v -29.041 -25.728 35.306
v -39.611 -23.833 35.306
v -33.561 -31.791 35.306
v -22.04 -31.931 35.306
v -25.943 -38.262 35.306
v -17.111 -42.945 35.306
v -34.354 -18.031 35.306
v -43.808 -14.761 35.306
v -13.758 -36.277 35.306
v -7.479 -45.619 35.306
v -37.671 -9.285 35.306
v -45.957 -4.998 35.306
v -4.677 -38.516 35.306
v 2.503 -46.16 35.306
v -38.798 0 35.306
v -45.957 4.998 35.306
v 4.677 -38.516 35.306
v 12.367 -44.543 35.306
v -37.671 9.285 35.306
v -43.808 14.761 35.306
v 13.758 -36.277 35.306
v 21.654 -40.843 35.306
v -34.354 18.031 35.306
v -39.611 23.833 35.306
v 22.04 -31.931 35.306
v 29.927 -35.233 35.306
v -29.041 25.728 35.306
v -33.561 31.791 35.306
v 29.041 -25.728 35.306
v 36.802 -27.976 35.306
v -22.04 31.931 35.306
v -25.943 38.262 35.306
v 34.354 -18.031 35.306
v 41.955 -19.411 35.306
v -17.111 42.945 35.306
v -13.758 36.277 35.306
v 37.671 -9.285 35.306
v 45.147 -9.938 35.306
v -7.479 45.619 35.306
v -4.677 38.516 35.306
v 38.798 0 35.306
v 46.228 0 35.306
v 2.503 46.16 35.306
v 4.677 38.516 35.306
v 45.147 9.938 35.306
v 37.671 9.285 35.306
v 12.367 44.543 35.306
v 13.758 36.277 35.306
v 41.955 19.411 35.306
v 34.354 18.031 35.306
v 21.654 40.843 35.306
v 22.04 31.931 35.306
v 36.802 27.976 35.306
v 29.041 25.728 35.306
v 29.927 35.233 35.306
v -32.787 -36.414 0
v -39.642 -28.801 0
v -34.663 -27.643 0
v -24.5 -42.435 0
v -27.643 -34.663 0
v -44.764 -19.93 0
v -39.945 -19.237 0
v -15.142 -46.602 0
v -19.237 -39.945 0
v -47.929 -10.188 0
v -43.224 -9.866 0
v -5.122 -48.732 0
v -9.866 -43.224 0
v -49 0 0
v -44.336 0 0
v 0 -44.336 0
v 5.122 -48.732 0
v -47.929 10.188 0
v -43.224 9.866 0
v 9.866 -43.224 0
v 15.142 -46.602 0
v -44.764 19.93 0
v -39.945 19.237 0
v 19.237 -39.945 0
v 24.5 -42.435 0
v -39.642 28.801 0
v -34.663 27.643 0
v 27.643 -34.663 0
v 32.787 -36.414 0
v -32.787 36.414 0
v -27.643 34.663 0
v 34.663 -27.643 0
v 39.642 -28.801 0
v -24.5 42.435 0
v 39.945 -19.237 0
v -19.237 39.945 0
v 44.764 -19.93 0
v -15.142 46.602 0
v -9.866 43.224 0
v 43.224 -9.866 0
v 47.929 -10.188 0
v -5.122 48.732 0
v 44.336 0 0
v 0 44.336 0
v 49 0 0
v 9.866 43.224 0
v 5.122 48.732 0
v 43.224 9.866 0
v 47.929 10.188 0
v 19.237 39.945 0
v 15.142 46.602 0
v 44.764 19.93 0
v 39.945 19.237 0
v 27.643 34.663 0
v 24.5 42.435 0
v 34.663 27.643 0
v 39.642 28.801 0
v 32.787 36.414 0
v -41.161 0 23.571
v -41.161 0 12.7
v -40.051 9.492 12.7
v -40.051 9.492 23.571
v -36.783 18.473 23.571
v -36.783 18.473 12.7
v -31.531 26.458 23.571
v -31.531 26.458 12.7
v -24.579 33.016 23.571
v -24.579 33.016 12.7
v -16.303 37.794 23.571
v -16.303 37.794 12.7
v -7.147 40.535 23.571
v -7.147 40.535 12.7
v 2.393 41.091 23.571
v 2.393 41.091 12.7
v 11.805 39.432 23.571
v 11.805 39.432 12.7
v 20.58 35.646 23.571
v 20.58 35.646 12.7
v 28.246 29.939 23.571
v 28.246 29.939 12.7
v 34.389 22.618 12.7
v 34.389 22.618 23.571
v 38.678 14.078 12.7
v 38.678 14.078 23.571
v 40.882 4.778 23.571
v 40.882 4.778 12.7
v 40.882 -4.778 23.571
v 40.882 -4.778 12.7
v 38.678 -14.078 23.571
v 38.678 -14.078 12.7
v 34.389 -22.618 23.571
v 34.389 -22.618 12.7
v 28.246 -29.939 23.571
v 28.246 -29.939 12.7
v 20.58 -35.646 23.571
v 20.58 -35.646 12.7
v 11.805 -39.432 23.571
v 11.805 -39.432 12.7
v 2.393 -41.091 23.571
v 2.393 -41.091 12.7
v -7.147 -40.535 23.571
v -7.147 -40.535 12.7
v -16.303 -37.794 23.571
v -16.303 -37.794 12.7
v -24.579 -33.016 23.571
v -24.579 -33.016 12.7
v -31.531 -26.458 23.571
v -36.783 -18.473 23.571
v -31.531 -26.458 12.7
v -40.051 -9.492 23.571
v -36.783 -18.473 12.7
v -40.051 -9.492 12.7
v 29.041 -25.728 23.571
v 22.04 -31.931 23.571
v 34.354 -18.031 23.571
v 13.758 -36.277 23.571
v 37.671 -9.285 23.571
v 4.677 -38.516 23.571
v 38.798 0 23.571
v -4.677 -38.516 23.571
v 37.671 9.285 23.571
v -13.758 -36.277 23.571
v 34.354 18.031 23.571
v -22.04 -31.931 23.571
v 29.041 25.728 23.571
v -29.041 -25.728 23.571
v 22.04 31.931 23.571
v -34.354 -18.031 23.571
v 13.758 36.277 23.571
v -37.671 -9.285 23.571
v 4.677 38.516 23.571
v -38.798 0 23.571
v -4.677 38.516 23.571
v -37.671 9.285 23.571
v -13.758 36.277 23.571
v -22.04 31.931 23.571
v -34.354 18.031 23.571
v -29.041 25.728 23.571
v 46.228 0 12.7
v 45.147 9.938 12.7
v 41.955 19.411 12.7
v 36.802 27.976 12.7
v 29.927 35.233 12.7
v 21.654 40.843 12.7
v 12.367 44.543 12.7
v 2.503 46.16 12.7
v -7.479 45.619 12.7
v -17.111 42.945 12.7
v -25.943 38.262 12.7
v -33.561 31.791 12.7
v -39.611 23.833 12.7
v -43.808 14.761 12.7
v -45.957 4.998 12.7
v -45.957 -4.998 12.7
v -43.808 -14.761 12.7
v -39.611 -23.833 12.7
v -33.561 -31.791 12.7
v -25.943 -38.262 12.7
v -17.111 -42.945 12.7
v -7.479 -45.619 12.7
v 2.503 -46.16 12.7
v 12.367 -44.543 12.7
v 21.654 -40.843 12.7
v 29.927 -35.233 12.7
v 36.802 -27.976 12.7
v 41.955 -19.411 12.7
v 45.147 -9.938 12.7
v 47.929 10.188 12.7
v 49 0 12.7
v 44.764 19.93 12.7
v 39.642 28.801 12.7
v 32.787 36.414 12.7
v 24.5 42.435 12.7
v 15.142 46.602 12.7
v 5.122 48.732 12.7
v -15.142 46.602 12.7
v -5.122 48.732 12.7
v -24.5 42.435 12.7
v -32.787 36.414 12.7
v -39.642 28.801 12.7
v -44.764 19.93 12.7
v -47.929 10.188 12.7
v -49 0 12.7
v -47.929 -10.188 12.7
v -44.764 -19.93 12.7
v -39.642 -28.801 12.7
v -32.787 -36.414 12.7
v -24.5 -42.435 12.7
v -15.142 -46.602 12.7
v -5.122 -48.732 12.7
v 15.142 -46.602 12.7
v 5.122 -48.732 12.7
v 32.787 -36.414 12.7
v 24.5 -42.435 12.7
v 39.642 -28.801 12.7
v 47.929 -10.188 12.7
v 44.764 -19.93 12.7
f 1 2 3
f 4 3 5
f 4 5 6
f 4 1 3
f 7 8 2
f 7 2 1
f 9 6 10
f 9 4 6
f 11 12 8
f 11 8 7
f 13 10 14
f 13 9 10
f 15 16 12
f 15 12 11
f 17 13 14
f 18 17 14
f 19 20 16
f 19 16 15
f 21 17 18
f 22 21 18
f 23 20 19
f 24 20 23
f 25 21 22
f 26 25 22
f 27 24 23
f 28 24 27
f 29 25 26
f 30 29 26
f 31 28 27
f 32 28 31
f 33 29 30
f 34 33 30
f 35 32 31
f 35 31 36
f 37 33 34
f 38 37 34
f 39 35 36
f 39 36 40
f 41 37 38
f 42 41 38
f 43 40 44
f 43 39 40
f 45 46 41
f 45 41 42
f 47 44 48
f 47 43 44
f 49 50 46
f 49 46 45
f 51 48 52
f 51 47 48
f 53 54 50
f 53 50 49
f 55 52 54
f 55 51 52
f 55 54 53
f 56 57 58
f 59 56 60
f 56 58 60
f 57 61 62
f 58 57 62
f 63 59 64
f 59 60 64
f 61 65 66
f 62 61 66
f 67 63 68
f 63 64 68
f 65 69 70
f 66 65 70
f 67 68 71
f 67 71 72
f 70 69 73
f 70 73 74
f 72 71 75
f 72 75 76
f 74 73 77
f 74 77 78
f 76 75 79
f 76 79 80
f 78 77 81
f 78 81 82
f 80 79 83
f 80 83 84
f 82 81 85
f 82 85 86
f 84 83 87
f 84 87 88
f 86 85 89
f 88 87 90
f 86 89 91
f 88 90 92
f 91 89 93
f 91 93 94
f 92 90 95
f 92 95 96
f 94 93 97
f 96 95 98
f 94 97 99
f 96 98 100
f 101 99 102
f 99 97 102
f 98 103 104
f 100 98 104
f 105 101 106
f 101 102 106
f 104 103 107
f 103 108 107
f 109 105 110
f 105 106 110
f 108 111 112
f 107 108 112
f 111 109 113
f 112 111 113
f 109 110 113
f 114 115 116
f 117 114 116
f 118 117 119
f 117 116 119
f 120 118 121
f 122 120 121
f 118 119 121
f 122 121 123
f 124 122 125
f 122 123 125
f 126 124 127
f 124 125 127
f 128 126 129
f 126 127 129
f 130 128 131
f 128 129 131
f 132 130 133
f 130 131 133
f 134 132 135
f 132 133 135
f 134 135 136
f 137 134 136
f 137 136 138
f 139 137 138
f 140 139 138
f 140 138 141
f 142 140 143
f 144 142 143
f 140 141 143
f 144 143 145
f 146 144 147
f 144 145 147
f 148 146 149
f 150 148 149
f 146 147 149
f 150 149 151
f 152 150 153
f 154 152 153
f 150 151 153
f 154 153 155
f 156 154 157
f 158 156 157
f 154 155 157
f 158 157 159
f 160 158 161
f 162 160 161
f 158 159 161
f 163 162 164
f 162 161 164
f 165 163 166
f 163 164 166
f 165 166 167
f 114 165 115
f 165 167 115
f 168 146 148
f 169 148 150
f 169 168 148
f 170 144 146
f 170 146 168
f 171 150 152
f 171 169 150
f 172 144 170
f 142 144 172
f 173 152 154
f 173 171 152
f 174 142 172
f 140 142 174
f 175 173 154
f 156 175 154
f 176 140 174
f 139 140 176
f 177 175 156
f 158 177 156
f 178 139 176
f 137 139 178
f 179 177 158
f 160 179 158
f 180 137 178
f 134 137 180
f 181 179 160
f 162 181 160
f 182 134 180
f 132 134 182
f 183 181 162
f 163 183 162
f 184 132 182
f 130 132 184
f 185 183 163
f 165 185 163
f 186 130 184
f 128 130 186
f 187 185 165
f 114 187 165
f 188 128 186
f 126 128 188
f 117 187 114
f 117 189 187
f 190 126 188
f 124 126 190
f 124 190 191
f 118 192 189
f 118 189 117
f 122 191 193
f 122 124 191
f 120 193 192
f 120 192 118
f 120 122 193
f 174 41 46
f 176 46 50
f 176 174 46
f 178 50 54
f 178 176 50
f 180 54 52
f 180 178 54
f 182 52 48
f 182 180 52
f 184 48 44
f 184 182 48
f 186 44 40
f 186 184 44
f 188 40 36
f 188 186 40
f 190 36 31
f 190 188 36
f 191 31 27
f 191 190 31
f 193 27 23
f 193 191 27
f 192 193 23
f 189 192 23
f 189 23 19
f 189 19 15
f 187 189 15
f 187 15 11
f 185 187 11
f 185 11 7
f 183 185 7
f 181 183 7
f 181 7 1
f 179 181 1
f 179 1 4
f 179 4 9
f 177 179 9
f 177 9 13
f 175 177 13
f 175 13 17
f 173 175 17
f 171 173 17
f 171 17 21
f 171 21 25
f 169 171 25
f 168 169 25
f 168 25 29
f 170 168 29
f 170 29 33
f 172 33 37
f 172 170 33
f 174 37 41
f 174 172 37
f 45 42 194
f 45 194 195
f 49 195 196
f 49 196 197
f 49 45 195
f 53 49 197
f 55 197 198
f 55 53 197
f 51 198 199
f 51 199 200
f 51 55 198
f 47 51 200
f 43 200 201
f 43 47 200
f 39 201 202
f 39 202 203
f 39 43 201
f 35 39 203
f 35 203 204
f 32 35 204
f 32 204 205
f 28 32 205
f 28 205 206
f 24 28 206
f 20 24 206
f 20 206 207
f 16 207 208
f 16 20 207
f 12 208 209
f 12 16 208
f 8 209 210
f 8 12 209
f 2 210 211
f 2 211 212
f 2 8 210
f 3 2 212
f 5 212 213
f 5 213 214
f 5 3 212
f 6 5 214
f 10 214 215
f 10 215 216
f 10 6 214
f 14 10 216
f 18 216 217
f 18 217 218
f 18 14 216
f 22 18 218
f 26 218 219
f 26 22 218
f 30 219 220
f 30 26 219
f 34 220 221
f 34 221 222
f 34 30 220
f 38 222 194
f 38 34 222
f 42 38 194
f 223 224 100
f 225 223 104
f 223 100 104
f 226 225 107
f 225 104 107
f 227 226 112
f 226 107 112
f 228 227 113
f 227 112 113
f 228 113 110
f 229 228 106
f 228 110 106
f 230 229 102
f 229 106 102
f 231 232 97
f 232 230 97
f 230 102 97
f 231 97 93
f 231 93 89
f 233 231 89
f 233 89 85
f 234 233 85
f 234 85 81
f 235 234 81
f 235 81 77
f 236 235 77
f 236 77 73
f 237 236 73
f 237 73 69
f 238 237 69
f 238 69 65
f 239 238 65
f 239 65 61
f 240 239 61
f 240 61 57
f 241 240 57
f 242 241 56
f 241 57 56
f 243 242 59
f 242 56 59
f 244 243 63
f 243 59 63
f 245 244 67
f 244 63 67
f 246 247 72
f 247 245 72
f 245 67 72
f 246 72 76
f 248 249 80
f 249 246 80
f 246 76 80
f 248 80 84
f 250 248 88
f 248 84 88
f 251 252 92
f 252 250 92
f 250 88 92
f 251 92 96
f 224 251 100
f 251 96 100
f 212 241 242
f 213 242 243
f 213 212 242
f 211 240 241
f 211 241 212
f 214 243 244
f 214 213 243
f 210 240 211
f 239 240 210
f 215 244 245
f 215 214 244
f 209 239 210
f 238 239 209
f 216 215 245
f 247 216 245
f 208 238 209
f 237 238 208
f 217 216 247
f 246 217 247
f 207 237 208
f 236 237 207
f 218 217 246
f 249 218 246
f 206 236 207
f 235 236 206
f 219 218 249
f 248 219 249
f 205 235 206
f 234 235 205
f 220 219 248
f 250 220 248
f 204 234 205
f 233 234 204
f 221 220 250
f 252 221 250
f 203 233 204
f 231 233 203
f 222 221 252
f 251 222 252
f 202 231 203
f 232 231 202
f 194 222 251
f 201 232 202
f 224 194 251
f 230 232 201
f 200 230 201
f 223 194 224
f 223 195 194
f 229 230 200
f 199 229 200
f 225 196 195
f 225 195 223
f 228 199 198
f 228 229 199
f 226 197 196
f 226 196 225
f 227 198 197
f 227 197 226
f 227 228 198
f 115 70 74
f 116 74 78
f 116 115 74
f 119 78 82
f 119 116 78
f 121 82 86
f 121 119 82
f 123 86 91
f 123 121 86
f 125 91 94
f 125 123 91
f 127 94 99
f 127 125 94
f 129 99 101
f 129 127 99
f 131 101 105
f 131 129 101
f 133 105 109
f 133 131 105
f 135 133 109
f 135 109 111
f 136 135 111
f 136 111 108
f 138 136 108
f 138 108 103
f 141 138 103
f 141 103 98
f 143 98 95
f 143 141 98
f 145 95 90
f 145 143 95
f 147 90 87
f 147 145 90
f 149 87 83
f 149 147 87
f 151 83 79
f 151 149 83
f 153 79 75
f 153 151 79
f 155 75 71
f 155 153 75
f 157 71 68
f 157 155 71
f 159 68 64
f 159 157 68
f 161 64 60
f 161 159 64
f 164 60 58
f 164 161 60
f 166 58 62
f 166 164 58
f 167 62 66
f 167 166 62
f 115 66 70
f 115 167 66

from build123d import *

# Parameters (mm, degrees)
SKETCH1_R         = 49
SKETCH1_R_2       = 38.7985
EXTRUDE1_DEPTH    = 35.306
SKETCH2_OUTSIDE_W = 128.604
SKETCH2_OUTSIDE_H = 128.604
SKETCH2_OUTSIDE_R = 46.228
EXTRUDE2_DEPTH    = 22.606
SKETCH3_R         = 41.1607
EXTRUDE3_DEPTH    = 23.5712
CHAMFER1_SIZE     = 3.175
CHAMFER1_SIZE2    = 12.7


with BuildPart() as part:
    # Sketch1 → Extrude1 (new body)
    with BuildSketch(Plane.XY):
        Circle(SKETCH1_R)
        Circle(SKETCH1_R_2, mode=Mode.SUBTRACT)
    extrude(amount=EXTRUDE1_DEPTH)

    # Sketch2 outside → Extrude2 (cut)
    with BuildSketch(Plane.XY.offset(35.306)):
        Rectangle(SKETCH2_OUTSIDE_W, SKETCH2_OUTSIDE_H)
        Circle(SKETCH2_OUTSIDE_R, mode=Mode.SUBTRACT)
    extrude(amount=-EXTRUDE2_DEPTH, mode=Mode.SUBTRACT)

    # Sketch3 → Extrude3 (cut)
    with BuildSketch(Plane(origin=(0, 0, 0), x_dir=(-1, 0, 0), z_dir=(0, 0, -1))):
        Circle(SKETCH3_R)
    extrude(amount=-EXTRUDE3_DEPTH, mode=Mode.SUBTRACT)

    # Chamfer1
    chamfer1_edges = [part.edges().sort_by_distance(p)[0] for p in [
        (41.1607, 0, 0),
    ]]
    chamfer1_side = [part.faces().sort_by_distance(p)[0] for p in [
        (-47.614070709, 0, 0),
    ]]
    chamfer(chamfer1_edges, length=CHAMFER1_SIZE, length2=CHAMFER1_SIZE2, reference=chamfer1_side[0])


solid = part.part
